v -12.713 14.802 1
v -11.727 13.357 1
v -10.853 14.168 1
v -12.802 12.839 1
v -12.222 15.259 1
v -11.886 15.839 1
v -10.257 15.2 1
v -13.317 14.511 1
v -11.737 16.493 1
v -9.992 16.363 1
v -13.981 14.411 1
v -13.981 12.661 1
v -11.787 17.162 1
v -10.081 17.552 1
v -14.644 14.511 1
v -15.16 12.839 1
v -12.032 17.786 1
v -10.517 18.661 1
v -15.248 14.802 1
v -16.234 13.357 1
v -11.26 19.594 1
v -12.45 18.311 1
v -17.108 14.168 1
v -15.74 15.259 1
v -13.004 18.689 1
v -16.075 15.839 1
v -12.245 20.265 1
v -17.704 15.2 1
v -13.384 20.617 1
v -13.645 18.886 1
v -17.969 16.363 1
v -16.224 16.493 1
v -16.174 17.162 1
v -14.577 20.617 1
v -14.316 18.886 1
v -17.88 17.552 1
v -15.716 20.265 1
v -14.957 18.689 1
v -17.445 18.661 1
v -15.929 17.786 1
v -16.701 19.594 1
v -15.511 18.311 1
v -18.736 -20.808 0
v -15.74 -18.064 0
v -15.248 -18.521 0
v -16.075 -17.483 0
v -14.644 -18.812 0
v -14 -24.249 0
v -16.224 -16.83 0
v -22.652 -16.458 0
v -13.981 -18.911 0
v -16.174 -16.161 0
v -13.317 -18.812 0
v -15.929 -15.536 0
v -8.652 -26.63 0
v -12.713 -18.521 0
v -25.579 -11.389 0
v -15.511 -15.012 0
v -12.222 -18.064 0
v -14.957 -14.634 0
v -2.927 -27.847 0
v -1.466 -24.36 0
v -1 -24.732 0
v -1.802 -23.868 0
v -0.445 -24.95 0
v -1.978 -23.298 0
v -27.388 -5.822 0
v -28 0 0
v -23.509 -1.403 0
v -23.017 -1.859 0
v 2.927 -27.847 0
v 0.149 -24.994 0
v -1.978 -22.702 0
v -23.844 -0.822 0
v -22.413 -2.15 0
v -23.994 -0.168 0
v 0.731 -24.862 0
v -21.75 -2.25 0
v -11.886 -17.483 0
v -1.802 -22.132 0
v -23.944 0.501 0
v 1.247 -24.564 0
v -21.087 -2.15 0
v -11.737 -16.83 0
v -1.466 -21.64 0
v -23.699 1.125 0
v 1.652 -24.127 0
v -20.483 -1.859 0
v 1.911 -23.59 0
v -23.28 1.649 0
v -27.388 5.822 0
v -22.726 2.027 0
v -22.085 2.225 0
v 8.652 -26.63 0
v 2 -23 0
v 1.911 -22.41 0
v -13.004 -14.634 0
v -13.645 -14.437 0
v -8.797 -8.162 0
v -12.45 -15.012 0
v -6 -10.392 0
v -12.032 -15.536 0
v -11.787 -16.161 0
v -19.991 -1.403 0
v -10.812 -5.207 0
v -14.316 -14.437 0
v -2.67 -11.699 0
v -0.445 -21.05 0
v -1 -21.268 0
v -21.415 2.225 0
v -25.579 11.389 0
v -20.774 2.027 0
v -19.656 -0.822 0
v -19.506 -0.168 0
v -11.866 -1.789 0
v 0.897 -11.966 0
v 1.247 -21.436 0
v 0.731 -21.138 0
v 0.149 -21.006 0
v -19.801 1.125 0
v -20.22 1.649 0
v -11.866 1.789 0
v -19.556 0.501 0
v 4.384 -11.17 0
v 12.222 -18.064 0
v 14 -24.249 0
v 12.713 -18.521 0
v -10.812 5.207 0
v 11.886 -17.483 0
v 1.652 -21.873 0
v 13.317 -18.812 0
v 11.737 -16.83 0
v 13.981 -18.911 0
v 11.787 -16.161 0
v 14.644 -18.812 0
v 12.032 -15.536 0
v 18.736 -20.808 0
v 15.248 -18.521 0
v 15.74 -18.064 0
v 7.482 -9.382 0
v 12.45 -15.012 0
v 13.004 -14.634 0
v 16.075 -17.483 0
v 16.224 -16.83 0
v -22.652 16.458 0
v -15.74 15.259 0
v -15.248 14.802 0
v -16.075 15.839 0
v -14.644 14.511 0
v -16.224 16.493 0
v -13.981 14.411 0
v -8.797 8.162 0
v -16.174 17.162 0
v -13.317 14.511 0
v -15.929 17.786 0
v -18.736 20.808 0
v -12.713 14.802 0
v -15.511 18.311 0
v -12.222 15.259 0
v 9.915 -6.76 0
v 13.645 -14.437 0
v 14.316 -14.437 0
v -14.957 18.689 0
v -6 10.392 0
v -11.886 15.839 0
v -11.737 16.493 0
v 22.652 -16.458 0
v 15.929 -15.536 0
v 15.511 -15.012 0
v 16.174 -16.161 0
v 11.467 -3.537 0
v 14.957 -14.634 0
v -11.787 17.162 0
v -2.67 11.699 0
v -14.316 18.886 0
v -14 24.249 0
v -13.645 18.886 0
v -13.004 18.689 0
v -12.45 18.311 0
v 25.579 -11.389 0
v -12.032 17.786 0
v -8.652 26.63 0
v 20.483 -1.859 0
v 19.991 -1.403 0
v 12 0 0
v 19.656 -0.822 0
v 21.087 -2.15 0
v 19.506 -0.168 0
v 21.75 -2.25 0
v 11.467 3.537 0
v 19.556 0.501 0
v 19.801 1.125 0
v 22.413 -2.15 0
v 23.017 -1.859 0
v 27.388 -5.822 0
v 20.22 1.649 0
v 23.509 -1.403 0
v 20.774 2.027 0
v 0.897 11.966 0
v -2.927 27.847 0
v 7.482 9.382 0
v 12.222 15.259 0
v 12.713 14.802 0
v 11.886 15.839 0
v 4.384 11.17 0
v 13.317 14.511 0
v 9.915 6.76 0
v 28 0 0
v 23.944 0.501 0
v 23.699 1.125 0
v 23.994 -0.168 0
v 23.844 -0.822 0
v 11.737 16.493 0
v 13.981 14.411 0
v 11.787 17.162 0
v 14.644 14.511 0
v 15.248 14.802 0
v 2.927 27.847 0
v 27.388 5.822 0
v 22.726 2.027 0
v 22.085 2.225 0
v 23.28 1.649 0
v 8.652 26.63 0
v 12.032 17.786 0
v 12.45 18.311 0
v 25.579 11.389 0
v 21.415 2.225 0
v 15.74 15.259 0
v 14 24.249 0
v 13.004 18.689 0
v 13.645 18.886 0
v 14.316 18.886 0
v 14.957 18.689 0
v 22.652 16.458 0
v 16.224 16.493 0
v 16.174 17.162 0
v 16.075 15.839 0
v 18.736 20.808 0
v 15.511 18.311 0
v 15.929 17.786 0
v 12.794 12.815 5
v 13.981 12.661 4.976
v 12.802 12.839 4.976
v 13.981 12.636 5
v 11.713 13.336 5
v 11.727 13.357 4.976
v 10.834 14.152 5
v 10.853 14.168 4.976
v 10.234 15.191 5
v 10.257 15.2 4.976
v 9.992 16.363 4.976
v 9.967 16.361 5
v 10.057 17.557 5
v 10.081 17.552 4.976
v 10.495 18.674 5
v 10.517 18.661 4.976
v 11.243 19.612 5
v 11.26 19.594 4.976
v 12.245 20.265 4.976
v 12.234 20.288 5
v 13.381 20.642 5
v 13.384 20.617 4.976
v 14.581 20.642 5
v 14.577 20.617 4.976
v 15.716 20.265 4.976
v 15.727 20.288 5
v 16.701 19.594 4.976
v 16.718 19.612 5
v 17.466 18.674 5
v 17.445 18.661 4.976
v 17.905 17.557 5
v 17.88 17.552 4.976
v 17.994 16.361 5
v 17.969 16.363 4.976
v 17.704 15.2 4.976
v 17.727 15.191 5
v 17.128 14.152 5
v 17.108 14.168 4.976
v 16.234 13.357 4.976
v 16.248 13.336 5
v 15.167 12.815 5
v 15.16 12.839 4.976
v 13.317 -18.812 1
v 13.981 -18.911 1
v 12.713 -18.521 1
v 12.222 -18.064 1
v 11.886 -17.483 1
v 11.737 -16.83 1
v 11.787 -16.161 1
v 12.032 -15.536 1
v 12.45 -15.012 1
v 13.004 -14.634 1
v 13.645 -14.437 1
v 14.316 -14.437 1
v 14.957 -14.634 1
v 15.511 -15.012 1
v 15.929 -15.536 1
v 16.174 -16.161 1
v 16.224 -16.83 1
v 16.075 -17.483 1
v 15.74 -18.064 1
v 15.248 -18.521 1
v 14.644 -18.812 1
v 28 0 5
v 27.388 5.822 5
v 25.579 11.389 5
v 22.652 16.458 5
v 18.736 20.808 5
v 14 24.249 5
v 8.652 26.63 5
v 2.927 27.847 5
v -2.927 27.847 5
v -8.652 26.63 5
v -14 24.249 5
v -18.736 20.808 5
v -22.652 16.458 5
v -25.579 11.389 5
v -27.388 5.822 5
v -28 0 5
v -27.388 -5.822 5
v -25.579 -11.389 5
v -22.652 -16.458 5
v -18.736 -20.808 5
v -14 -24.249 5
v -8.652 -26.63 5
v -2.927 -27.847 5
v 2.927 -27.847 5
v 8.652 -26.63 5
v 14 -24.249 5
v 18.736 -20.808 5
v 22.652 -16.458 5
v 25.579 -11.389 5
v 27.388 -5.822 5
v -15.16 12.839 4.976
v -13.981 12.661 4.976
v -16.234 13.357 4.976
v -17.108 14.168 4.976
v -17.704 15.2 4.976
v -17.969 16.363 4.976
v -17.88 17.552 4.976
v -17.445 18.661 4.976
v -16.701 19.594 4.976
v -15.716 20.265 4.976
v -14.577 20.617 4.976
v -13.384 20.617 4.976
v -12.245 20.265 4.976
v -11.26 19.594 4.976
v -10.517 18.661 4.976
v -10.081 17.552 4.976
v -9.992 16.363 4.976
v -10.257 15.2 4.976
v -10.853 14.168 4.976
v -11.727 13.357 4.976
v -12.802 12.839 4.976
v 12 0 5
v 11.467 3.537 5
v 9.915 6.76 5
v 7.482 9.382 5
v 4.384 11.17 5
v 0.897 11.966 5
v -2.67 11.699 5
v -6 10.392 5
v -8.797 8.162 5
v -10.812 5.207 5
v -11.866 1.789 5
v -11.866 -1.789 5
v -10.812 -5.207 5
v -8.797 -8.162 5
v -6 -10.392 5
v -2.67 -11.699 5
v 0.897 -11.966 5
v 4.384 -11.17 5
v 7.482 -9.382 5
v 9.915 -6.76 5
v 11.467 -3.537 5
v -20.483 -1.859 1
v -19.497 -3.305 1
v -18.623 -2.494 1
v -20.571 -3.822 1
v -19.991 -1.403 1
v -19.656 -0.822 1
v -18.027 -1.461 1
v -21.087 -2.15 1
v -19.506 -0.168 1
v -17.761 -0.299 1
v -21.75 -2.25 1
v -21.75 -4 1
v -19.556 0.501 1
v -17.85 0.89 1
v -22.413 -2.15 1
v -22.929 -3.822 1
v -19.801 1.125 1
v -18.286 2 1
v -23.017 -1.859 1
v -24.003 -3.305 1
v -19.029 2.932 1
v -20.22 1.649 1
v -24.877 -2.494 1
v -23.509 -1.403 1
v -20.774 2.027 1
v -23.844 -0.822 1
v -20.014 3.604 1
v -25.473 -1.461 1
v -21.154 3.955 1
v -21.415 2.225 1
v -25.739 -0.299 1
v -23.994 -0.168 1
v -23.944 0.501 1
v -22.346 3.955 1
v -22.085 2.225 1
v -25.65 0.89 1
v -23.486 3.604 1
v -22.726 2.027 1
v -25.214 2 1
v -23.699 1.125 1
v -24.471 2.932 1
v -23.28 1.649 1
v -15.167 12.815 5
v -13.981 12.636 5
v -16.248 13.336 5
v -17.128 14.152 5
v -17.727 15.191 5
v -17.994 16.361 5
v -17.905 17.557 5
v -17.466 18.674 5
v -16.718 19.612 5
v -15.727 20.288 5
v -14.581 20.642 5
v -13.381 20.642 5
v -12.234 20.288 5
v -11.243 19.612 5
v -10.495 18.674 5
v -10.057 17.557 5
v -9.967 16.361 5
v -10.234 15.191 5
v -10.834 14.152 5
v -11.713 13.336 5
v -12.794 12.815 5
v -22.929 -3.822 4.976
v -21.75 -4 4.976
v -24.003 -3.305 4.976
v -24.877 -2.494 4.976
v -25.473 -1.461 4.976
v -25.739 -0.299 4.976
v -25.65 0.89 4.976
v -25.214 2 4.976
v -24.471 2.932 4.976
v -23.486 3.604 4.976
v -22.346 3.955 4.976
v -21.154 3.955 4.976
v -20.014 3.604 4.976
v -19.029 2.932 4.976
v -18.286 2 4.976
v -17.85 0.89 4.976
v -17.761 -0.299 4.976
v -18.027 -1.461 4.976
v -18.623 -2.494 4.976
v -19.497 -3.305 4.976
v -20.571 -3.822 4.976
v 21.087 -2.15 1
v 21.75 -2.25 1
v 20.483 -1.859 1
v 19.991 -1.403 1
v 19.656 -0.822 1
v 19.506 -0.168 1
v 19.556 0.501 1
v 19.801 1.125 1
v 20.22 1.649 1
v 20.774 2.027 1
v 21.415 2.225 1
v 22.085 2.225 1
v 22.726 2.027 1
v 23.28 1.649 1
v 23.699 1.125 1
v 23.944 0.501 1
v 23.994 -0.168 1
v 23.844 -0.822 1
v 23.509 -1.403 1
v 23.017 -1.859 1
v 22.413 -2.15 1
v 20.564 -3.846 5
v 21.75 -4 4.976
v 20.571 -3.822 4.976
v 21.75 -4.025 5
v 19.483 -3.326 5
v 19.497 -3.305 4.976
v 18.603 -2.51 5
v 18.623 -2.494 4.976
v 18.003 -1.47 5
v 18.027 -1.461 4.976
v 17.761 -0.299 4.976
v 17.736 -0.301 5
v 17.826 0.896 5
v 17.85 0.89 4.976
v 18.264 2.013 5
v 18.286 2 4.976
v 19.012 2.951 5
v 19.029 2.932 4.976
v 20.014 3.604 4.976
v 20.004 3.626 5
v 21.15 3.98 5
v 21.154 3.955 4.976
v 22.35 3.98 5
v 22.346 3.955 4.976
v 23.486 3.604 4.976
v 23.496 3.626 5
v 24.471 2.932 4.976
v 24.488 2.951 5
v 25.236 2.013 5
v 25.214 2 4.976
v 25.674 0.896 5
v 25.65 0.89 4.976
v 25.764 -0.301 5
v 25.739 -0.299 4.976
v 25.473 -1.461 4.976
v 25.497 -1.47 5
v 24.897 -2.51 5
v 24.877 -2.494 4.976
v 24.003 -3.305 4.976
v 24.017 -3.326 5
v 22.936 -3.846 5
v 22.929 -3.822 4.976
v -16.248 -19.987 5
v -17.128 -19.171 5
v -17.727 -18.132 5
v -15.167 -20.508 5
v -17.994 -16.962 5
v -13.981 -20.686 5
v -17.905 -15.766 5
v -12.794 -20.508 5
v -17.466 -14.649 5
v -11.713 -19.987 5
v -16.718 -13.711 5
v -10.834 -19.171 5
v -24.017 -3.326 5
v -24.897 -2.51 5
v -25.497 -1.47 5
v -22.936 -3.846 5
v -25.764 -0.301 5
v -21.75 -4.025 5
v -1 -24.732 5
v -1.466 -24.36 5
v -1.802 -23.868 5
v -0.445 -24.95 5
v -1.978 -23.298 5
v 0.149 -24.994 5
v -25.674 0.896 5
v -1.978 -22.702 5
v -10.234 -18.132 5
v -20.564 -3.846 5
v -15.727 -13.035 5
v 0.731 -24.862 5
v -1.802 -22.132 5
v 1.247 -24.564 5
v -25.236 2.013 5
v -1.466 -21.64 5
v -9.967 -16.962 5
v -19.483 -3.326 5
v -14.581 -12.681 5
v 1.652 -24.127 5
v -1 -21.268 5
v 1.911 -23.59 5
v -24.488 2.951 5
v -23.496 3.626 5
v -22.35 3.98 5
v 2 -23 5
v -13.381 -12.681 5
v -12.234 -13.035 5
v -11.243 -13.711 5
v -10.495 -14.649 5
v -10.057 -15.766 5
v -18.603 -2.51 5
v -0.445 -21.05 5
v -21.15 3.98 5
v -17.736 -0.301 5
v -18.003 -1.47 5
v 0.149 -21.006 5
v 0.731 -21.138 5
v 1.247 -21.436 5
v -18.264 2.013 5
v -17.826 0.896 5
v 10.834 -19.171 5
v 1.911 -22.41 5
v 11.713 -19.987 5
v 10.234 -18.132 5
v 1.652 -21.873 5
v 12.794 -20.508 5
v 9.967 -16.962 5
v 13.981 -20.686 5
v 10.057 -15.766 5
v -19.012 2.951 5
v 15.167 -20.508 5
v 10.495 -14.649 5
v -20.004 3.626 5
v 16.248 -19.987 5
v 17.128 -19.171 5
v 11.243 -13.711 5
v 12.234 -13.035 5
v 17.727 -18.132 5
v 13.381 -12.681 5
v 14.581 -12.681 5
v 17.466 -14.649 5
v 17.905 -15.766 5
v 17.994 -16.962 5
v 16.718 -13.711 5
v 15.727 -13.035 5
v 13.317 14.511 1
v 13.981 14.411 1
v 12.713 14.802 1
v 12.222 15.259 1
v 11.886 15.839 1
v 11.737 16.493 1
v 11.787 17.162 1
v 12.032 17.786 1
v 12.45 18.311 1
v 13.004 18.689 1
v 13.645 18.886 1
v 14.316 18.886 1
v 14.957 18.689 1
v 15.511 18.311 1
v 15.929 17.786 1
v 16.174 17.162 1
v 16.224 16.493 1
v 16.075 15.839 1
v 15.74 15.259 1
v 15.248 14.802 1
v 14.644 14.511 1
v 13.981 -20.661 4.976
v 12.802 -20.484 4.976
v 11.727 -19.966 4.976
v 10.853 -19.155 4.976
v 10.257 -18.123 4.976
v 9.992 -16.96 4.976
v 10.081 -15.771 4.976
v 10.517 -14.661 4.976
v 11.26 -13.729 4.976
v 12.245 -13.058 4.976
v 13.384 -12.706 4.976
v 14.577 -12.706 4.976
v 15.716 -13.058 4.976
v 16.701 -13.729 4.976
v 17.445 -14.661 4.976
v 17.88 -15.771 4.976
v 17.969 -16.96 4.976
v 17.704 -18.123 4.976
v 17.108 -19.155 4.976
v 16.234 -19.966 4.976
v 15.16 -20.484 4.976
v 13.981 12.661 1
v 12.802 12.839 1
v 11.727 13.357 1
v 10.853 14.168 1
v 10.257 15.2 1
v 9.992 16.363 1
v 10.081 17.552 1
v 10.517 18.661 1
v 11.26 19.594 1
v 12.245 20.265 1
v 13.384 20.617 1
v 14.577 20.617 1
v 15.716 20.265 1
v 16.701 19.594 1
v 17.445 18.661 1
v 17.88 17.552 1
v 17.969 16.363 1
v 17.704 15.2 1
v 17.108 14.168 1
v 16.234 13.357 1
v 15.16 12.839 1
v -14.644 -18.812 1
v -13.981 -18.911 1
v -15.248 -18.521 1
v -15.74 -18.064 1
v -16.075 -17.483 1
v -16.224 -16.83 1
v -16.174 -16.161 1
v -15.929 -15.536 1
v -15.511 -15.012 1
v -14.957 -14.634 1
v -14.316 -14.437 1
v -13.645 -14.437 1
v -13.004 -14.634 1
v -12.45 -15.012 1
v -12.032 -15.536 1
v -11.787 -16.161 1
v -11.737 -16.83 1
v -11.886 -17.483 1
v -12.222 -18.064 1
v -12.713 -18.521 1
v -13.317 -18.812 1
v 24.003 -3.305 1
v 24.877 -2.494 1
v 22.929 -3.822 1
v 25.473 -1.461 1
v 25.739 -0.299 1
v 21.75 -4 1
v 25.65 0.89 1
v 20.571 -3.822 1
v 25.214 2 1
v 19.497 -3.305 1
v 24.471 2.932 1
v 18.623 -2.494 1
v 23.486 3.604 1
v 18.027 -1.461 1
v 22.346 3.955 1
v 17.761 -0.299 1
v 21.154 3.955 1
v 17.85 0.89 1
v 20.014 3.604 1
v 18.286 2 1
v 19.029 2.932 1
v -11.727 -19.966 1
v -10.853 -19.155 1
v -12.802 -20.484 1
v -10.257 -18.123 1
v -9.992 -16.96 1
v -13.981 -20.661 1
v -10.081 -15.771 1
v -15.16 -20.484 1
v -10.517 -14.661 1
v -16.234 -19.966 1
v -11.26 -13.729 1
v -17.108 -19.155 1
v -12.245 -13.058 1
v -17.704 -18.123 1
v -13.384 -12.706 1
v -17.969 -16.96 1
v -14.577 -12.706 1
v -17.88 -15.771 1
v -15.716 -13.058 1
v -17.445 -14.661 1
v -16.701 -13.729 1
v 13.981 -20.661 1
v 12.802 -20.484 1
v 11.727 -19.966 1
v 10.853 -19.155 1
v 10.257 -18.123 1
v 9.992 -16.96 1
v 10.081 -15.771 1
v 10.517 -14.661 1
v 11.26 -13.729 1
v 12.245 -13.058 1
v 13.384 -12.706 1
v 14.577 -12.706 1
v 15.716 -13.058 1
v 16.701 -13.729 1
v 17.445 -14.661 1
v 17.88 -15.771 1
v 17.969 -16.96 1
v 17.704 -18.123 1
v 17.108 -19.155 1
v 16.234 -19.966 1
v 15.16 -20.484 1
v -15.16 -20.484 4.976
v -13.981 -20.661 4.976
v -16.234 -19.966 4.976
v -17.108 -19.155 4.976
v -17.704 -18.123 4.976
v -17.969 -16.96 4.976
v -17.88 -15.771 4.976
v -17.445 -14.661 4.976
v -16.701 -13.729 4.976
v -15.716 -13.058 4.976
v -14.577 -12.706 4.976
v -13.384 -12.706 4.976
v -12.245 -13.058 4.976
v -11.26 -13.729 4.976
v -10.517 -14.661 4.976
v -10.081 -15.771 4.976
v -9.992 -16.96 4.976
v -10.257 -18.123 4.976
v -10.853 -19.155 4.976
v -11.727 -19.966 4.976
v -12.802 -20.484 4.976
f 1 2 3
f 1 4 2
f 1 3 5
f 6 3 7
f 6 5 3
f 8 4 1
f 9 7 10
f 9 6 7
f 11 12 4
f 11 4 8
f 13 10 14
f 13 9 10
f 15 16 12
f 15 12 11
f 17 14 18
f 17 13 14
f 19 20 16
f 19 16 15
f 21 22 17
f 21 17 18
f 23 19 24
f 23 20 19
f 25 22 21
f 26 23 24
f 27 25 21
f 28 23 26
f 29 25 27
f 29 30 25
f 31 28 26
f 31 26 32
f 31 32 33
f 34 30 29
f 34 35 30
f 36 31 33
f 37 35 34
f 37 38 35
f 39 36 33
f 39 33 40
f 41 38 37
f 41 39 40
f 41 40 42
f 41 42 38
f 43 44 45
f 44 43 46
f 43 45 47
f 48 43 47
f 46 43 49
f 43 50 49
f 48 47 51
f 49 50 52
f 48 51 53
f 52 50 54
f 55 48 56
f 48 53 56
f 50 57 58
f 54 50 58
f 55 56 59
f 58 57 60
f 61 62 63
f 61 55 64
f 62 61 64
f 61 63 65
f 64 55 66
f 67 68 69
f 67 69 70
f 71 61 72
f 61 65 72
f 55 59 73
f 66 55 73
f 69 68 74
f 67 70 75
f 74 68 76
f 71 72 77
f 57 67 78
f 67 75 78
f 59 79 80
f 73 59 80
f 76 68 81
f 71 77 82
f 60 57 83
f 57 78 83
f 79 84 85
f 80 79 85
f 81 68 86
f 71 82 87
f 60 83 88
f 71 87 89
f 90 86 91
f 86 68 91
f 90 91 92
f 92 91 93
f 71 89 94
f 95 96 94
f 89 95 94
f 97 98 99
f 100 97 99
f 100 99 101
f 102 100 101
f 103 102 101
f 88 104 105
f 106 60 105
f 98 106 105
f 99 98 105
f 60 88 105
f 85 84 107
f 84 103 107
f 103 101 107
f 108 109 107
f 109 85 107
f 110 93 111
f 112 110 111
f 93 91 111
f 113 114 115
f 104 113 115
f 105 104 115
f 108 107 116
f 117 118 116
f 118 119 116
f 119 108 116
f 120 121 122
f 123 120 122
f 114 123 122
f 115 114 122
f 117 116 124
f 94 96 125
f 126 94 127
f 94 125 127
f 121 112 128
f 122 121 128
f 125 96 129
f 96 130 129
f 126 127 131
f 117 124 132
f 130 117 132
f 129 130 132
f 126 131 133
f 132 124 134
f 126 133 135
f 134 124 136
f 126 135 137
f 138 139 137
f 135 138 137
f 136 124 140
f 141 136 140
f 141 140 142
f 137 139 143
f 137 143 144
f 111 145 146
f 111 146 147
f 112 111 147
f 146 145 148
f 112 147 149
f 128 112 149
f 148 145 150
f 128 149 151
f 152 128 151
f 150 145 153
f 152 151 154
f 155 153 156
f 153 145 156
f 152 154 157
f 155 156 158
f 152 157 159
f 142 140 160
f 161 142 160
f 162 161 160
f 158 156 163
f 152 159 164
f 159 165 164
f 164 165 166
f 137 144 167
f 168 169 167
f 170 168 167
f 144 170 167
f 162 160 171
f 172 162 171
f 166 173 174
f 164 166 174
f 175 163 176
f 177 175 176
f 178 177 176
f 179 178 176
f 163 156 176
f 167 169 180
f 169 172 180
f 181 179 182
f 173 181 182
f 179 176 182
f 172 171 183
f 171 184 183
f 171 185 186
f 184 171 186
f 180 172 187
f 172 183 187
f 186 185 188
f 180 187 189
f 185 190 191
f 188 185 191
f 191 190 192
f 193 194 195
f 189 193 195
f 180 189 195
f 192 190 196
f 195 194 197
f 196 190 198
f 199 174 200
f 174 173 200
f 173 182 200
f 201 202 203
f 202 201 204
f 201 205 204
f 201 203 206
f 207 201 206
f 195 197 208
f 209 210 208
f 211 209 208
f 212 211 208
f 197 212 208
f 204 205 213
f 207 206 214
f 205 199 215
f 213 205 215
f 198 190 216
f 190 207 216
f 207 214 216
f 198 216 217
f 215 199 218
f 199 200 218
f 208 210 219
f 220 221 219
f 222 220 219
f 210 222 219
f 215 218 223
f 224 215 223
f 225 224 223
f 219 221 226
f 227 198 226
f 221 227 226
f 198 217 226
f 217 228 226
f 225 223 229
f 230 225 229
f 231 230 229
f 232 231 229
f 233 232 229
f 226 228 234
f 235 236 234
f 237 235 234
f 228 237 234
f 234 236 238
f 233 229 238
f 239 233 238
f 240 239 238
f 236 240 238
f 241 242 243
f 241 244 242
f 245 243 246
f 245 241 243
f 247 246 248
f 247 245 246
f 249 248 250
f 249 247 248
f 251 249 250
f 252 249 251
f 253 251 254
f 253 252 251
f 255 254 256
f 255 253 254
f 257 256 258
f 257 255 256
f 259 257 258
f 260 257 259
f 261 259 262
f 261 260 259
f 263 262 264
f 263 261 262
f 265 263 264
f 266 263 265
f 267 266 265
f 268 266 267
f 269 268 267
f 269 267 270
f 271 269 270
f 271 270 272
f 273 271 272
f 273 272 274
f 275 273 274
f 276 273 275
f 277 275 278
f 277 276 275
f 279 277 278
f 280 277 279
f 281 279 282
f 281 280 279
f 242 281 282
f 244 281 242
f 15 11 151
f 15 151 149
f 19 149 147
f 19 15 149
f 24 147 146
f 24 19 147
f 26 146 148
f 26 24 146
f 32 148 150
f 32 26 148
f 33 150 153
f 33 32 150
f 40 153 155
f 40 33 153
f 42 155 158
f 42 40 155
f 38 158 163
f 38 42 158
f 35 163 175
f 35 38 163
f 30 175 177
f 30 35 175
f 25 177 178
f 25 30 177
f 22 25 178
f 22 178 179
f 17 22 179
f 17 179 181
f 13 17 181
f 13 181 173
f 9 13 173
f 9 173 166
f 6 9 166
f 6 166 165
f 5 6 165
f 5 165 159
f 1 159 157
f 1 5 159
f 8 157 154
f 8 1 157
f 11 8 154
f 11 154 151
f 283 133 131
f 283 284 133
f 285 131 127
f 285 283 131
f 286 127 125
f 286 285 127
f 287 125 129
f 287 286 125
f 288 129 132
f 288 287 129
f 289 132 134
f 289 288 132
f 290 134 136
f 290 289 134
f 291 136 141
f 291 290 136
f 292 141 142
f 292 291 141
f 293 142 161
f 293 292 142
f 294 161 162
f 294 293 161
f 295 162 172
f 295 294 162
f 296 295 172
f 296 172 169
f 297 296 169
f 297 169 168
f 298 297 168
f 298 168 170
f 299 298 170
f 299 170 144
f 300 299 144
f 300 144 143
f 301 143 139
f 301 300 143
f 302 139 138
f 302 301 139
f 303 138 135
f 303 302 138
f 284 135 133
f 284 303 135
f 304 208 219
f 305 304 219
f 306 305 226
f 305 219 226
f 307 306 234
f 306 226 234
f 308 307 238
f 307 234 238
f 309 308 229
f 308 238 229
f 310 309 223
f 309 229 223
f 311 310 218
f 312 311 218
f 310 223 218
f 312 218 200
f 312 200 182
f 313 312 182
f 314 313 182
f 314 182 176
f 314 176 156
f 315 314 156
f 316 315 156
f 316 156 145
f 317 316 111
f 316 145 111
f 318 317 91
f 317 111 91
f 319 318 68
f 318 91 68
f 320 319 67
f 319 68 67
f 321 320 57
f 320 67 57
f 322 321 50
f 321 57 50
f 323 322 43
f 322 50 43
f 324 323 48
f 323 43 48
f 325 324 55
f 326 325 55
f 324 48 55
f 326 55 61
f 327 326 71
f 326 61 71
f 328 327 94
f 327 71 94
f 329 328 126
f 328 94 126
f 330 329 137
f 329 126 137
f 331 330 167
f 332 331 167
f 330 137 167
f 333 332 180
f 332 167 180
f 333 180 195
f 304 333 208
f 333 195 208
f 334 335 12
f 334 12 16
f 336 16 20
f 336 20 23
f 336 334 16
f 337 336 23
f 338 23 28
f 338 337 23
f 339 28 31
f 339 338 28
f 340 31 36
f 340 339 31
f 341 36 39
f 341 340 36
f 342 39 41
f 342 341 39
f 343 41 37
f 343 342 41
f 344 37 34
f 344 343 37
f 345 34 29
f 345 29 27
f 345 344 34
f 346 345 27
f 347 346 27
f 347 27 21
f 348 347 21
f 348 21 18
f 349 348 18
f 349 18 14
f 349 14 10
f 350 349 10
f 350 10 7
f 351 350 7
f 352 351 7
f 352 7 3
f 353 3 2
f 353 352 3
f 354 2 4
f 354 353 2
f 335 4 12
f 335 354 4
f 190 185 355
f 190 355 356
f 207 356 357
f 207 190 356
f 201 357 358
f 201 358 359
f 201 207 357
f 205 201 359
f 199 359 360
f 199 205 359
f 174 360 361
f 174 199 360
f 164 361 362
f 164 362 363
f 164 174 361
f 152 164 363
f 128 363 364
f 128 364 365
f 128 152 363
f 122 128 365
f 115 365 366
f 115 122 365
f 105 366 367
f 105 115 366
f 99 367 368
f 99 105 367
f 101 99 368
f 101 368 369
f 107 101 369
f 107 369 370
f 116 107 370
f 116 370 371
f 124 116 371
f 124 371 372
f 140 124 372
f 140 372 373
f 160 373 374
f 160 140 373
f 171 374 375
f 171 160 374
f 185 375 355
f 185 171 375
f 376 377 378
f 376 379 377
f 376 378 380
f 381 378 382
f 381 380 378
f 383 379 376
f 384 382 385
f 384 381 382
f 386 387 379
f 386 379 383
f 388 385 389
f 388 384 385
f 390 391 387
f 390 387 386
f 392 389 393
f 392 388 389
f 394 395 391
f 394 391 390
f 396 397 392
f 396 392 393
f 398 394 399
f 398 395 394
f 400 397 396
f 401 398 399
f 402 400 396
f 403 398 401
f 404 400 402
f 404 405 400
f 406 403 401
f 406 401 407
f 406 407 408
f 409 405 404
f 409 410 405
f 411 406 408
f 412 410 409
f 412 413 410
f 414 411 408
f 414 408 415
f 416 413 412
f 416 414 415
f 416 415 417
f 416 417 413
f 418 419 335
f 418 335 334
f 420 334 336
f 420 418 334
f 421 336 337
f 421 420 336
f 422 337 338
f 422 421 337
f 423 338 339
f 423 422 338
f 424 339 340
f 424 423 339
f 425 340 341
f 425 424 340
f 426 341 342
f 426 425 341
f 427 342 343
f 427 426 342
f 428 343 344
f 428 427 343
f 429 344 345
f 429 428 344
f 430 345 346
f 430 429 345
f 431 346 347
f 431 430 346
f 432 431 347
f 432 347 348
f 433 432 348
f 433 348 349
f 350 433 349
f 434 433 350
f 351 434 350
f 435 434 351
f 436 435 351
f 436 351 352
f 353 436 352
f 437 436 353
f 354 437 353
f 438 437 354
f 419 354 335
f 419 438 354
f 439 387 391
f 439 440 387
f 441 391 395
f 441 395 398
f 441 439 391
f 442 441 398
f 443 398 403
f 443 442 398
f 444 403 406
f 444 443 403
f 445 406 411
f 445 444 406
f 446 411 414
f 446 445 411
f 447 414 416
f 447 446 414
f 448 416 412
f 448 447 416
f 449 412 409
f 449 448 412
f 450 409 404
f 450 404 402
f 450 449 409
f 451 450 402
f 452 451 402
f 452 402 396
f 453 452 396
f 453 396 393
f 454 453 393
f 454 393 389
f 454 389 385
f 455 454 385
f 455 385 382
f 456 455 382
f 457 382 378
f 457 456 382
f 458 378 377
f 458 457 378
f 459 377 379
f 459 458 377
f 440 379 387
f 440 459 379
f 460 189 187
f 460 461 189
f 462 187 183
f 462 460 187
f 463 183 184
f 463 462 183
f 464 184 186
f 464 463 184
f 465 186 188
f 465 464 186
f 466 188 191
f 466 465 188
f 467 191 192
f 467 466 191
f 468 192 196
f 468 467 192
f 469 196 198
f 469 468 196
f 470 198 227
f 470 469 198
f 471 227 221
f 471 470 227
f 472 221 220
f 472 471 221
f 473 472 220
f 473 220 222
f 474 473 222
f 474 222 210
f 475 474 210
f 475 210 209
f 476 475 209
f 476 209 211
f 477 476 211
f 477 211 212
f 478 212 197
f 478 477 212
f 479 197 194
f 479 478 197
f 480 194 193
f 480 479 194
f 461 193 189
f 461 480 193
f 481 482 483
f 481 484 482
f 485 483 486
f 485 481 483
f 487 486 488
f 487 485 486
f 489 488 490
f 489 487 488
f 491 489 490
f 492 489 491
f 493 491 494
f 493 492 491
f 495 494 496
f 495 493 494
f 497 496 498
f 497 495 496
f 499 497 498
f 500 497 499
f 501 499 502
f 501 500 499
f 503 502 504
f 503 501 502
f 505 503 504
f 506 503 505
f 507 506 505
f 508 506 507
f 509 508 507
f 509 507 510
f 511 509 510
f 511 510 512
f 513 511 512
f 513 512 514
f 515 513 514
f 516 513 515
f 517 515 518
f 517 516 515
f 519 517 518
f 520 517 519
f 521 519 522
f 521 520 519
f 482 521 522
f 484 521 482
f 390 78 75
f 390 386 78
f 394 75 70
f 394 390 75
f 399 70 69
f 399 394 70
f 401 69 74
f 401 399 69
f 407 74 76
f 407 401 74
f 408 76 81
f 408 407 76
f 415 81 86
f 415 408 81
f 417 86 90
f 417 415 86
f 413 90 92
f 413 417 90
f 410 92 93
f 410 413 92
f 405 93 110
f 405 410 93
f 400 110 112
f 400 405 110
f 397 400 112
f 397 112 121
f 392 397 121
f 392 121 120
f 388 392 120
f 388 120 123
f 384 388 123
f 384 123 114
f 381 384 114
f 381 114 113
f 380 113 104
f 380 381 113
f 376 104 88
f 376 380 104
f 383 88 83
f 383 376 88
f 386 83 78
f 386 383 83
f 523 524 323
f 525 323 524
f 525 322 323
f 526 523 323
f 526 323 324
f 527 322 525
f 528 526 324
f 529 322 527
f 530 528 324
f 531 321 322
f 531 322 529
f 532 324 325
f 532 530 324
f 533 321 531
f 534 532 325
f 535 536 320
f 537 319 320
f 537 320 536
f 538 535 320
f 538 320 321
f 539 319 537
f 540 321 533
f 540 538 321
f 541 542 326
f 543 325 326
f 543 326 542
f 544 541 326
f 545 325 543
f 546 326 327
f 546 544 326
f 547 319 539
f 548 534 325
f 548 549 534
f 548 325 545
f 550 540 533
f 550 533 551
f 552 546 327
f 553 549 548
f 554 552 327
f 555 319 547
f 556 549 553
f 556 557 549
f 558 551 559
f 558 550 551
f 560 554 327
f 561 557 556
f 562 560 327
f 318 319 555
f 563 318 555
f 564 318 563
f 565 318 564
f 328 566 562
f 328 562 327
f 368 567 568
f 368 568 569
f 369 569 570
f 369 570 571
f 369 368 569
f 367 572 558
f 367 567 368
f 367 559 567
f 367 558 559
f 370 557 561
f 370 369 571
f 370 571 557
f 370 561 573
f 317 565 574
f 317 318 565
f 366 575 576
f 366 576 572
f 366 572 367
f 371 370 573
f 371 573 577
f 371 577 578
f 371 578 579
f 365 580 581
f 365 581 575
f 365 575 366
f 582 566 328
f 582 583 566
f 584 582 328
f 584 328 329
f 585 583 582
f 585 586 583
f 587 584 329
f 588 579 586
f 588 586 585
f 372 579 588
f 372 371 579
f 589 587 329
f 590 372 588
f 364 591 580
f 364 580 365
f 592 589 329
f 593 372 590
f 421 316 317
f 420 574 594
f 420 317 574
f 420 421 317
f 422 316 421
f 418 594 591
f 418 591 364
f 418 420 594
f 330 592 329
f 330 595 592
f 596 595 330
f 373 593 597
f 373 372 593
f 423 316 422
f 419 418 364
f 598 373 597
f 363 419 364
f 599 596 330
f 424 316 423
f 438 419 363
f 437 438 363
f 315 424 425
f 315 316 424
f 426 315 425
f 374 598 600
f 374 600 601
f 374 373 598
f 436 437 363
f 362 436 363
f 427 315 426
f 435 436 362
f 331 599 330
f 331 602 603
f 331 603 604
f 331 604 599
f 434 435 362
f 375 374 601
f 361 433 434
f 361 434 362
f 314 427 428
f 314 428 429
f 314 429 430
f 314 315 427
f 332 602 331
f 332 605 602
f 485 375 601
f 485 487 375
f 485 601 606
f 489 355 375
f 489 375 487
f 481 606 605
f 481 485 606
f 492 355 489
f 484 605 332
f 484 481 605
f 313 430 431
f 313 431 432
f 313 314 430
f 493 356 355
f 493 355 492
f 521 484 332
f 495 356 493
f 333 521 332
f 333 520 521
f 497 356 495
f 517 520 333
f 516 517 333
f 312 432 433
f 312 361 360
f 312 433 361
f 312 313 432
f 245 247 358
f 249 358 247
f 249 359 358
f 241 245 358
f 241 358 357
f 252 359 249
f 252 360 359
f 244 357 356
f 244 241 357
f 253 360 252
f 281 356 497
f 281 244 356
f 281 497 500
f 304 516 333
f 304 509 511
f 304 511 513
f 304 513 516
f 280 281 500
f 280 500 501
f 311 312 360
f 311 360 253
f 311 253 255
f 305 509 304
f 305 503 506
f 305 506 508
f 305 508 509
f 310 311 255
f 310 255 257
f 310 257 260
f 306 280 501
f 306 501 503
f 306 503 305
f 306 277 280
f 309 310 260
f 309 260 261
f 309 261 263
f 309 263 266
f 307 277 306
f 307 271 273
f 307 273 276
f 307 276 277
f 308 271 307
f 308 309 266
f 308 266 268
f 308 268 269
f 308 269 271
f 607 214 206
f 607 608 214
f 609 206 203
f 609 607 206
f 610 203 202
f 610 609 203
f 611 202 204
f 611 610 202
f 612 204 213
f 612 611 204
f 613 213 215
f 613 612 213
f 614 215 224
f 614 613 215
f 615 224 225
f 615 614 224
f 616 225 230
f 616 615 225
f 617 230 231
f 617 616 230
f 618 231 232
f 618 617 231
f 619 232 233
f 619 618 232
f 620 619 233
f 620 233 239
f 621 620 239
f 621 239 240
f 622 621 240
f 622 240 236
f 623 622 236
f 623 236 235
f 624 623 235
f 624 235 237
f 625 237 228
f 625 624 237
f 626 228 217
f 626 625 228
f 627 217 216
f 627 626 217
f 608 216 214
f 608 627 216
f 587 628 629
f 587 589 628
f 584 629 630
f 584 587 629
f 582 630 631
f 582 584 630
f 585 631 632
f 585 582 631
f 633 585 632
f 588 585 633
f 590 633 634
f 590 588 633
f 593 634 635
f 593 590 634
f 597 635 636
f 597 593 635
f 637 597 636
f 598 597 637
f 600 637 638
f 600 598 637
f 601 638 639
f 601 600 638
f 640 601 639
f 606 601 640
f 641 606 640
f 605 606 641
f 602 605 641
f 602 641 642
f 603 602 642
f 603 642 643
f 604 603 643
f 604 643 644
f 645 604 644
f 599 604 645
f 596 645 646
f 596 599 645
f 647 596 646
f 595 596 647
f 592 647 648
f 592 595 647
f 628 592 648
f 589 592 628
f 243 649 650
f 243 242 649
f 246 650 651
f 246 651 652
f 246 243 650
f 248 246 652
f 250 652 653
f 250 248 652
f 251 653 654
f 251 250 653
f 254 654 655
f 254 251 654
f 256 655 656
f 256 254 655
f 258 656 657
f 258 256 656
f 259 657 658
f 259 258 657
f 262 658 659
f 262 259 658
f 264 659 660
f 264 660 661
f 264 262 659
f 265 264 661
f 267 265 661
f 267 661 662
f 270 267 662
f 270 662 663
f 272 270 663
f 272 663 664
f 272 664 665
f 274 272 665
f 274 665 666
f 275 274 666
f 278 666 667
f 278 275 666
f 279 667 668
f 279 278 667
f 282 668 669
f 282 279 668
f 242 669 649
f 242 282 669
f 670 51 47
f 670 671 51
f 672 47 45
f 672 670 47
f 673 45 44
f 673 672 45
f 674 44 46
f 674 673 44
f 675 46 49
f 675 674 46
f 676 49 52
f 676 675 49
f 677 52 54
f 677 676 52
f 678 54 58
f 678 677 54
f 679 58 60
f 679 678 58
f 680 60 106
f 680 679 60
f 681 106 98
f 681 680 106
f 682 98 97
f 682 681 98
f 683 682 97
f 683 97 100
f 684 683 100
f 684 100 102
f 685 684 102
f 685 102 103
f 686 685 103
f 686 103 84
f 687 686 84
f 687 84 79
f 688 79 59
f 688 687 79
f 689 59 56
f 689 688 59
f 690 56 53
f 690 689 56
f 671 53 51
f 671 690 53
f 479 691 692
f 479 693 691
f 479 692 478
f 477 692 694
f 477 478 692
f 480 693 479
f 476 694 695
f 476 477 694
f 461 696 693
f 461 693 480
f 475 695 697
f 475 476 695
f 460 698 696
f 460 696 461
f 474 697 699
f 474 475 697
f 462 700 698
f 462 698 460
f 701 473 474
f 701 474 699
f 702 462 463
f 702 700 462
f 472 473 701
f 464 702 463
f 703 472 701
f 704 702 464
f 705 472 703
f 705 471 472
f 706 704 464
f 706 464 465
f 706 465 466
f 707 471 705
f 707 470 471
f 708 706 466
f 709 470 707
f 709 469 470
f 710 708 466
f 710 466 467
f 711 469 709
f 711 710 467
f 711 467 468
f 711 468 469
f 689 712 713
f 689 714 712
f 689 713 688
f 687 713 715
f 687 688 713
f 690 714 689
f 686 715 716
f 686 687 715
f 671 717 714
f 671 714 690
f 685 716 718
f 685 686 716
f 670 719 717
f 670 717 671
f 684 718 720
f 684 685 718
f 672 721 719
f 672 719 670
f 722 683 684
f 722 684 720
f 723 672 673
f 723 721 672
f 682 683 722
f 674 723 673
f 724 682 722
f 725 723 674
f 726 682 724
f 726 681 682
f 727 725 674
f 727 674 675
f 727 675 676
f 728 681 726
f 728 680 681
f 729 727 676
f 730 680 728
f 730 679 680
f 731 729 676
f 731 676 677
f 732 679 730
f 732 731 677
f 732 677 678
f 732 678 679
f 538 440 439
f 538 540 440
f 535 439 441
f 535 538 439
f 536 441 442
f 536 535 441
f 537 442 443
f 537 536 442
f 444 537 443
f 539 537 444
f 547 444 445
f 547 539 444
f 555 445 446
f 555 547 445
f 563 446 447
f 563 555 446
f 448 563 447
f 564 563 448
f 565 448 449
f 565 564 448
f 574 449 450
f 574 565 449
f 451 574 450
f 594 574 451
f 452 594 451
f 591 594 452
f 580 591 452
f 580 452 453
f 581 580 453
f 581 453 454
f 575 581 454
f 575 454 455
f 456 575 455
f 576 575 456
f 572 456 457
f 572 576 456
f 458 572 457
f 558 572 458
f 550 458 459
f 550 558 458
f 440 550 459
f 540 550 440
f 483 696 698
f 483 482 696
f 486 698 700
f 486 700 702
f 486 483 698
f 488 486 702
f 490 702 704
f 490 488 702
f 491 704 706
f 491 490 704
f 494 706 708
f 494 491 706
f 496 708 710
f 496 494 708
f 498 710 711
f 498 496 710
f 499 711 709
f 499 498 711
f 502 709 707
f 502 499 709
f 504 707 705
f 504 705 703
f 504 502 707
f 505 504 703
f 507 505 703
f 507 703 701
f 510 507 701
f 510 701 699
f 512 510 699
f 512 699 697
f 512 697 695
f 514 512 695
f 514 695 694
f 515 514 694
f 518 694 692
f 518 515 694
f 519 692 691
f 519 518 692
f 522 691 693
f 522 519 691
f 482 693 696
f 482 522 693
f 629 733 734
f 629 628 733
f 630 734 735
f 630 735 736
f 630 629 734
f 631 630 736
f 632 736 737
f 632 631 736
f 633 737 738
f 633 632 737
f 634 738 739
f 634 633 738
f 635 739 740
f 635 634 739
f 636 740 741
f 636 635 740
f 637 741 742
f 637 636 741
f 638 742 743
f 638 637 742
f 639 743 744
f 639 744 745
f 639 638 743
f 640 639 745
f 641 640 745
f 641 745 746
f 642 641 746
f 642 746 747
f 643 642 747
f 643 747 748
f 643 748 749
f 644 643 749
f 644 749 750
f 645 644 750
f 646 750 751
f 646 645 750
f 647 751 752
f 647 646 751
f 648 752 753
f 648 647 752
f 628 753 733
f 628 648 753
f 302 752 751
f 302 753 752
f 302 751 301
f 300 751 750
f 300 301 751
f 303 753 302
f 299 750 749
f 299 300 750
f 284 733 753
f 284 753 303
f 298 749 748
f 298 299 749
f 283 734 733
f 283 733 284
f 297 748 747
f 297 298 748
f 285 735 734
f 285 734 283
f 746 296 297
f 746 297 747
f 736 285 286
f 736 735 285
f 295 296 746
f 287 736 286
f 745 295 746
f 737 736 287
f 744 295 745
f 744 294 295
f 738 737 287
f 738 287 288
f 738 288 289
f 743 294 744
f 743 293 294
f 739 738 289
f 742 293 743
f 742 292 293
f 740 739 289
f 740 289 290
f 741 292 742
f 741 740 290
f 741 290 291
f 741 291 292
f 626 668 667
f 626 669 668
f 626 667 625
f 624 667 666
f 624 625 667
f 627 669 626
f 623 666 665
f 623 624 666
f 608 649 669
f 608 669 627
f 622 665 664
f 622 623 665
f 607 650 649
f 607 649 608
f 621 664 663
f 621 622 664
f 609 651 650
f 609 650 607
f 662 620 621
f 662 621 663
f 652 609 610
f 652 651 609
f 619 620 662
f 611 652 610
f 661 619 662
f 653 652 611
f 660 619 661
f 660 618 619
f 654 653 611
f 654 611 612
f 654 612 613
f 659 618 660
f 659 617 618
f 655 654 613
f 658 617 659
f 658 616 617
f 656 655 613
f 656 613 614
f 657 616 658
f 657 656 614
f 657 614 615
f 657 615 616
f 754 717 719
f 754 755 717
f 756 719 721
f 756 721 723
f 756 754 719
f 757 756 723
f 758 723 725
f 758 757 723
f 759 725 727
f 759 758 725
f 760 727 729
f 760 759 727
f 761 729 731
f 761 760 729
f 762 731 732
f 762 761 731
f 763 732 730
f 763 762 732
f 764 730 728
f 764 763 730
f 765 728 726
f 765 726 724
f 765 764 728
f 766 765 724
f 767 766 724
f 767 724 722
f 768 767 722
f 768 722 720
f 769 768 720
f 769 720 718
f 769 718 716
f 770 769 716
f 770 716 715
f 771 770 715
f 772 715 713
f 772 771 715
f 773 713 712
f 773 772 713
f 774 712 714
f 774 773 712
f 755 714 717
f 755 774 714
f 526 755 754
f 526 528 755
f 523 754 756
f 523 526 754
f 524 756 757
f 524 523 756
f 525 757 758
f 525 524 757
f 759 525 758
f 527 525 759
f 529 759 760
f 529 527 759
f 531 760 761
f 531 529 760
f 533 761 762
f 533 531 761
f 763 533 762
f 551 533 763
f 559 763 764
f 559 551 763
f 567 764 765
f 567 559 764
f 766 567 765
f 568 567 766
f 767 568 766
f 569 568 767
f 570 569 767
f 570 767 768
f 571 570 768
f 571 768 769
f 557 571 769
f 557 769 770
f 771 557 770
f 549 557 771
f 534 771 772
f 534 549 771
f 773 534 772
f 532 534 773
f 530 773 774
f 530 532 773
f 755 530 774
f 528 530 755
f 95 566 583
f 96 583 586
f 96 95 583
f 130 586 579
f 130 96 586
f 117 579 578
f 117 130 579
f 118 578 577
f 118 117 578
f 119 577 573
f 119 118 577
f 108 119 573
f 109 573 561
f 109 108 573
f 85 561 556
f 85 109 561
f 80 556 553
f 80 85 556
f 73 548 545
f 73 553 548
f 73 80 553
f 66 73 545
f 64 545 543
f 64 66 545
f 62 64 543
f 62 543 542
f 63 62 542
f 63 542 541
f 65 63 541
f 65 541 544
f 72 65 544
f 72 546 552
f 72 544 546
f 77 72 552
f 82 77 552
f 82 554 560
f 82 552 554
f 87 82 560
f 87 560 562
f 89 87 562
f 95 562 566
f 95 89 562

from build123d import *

# Parameters (mm, degrees)
SKETCH_1_R                  = 28
SKETCH_1_R_2                = 12
EXTRUDE_1_DEPTH             = 5
HOLE_WIZARD_M4_1_AT_2_COUNT = 2
HOLE_WIZARD_M4_1_AT_2_PITCH = 39.424388736
HOLE_WIZARD_M4_1_AT_3_COUNT = 2
HOLE_WIZARD_M4_1_AT_3_PITCH = 39.424388736
HOLE_WIZARD_M4_1_AT_4_COUNT = 2
HOLE_WIZARD_M4_1_AT_4_PITCH = 18.383894388
HOLE_WIZARD_M4_1_AT_5_COUNT = 2
HOLE_WIZARD_M4_1_AT_5_PITCH = 39.424388736
HOLE_WIZARD_M4_1_AT_6_COUNT = 2
HOLE_WIZARD_M4_1_AT_6_PITCH = 18.383894388
HOLE_WIZARD_M4_1_AT_7_COUNT = 2
HOLE_WIZARD_M4_1_AT_7_PITCH = 43.5
SKETCH_4_R                  = 2
CUT_EXTRUDE_1_DEPTH         = 10


with BuildPart() as part:
    # 草图1 → 凸台-拉伸1 (new body)
    with BuildSketch(Plane.XY):
        Circle(SKETCH_1_R)
        Circle(SKETCH_1_R_2, mode=Mode.SUBTRACT)
    extrude(amount=EXTRUDE_1_DEPTH)

    # 草图3 → M4 六角凹头盖的柱孔1 (revolve, cut)
    with BuildSketch(Plane(origin=(21.75, 0, 5), x_dir=(0, -1, 0), z_dir=(1, 0, 0))):
        Polygon((0, 0), (0, 5), (2.25, 5), (2.25, 4), (4, 4), (4, 0.024142219), (4.025, 0), align=None)
    hole_wizard_m4_1 = revolve(axis=Axis((21.75, 0, 11.35), (0, 0, -1)), mode=Mode.SUBTRACT)

    # M4 六角凹头盖的柱孔1 at 2: M4 六角凹头盖的柱孔1 ×2
    with Locations(*[Vector(-0.9063077870366496, 0.42261826174070033, 0) * (i * HOLE_WIZARD_M4_1_AT_2_PITCH) for i in range(1, HOLE_WIZARD_M4_1_AT_2_COUNT)]):
        add(hole_wizard_m4_1, mode=Mode.SUBTRACT)

    # M4 六角凹头盖的柱孔1 at 3: M4 六角凹头盖的柱孔1 ×2
    with Locations(*[Vector(-0.9063077870125524, 0.42261826179237694, 0) * (i * HOLE_WIZARD_M4_1_AT_3_PITCH) for i in range(1, HOLE_WIZARD_M4_1_AT_3_COUNT)]):
        add(hole_wizard_m4_1, mode=Mode.SUBTRACT)

    # M4 六角凹头盖的柱孔1 at 4: M4 六角凹头盖的柱孔1 ×2
    with Locations(*[Vector(-0.42261826172613226, -0.9063077870434427, 0) * (i * HOLE_WIZARD_M4_1_AT_4_PITCH) for i in range(1, HOLE_WIZARD_M4_1_AT_4_COUNT)]):
        add(hole_wizard_m4_1, mode=Mode.SUBTRACT)

    # M4 六角凹头盖的柱孔1 at 5: M4 六角凹头盖的柱孔1 ×2
    with Locations(*[Vector(-0.9063077870125524, -0.42261826179237694, 0) * (i * HOLE_WIZARD_M4_1_AT_5_PITCH) for i in range(1, HOLE_WIZARD_M4_1_AT_5_COUNT)]):
        add(hole_wizard_m4_1, mode=Mode.SUBTRACT)

    # M4 六角凹头盖的柱孔1 at 6: M4 六角凹头盖的柱孔1 ×2
    with Locations(*[Vector(-0.42261826172613226, 0.9063077870434427, 0) * (i * HOLE_WIZARD_M4_1_AT_6_PITCH) for i in range(1, HOLE_WIZARD_M4_1_AT_6_COUNT)]):
        add(hole_wizard_m4_1, mode=Mode.SUBTRACT)

    # M4 六角凹头盖的柱孔1 at 7: M4 六角凹头盖的柱孔1 ×2
    with Locations(*[(-i * HOLE_WIZARD_M4_1_AT_7_PITCH, 0, 0) for i in range(1, HOLE_WIZARD_M4_1_AT_7_COUNT)]):
        add(hole_wizard_m4_1, mode=Mode.SUBTRACT)

    # 草图4 → 切除-拉伸1 (cut)
    with BuildSketch(Plane.XY):
        with Locations((0, -23)):
            Circle(SKETCH_4_R)
    extrude(amount=CUT_EXTRUDE_1_DEPTH, mode=Mode.SUBTRACT)


solid = part.part
